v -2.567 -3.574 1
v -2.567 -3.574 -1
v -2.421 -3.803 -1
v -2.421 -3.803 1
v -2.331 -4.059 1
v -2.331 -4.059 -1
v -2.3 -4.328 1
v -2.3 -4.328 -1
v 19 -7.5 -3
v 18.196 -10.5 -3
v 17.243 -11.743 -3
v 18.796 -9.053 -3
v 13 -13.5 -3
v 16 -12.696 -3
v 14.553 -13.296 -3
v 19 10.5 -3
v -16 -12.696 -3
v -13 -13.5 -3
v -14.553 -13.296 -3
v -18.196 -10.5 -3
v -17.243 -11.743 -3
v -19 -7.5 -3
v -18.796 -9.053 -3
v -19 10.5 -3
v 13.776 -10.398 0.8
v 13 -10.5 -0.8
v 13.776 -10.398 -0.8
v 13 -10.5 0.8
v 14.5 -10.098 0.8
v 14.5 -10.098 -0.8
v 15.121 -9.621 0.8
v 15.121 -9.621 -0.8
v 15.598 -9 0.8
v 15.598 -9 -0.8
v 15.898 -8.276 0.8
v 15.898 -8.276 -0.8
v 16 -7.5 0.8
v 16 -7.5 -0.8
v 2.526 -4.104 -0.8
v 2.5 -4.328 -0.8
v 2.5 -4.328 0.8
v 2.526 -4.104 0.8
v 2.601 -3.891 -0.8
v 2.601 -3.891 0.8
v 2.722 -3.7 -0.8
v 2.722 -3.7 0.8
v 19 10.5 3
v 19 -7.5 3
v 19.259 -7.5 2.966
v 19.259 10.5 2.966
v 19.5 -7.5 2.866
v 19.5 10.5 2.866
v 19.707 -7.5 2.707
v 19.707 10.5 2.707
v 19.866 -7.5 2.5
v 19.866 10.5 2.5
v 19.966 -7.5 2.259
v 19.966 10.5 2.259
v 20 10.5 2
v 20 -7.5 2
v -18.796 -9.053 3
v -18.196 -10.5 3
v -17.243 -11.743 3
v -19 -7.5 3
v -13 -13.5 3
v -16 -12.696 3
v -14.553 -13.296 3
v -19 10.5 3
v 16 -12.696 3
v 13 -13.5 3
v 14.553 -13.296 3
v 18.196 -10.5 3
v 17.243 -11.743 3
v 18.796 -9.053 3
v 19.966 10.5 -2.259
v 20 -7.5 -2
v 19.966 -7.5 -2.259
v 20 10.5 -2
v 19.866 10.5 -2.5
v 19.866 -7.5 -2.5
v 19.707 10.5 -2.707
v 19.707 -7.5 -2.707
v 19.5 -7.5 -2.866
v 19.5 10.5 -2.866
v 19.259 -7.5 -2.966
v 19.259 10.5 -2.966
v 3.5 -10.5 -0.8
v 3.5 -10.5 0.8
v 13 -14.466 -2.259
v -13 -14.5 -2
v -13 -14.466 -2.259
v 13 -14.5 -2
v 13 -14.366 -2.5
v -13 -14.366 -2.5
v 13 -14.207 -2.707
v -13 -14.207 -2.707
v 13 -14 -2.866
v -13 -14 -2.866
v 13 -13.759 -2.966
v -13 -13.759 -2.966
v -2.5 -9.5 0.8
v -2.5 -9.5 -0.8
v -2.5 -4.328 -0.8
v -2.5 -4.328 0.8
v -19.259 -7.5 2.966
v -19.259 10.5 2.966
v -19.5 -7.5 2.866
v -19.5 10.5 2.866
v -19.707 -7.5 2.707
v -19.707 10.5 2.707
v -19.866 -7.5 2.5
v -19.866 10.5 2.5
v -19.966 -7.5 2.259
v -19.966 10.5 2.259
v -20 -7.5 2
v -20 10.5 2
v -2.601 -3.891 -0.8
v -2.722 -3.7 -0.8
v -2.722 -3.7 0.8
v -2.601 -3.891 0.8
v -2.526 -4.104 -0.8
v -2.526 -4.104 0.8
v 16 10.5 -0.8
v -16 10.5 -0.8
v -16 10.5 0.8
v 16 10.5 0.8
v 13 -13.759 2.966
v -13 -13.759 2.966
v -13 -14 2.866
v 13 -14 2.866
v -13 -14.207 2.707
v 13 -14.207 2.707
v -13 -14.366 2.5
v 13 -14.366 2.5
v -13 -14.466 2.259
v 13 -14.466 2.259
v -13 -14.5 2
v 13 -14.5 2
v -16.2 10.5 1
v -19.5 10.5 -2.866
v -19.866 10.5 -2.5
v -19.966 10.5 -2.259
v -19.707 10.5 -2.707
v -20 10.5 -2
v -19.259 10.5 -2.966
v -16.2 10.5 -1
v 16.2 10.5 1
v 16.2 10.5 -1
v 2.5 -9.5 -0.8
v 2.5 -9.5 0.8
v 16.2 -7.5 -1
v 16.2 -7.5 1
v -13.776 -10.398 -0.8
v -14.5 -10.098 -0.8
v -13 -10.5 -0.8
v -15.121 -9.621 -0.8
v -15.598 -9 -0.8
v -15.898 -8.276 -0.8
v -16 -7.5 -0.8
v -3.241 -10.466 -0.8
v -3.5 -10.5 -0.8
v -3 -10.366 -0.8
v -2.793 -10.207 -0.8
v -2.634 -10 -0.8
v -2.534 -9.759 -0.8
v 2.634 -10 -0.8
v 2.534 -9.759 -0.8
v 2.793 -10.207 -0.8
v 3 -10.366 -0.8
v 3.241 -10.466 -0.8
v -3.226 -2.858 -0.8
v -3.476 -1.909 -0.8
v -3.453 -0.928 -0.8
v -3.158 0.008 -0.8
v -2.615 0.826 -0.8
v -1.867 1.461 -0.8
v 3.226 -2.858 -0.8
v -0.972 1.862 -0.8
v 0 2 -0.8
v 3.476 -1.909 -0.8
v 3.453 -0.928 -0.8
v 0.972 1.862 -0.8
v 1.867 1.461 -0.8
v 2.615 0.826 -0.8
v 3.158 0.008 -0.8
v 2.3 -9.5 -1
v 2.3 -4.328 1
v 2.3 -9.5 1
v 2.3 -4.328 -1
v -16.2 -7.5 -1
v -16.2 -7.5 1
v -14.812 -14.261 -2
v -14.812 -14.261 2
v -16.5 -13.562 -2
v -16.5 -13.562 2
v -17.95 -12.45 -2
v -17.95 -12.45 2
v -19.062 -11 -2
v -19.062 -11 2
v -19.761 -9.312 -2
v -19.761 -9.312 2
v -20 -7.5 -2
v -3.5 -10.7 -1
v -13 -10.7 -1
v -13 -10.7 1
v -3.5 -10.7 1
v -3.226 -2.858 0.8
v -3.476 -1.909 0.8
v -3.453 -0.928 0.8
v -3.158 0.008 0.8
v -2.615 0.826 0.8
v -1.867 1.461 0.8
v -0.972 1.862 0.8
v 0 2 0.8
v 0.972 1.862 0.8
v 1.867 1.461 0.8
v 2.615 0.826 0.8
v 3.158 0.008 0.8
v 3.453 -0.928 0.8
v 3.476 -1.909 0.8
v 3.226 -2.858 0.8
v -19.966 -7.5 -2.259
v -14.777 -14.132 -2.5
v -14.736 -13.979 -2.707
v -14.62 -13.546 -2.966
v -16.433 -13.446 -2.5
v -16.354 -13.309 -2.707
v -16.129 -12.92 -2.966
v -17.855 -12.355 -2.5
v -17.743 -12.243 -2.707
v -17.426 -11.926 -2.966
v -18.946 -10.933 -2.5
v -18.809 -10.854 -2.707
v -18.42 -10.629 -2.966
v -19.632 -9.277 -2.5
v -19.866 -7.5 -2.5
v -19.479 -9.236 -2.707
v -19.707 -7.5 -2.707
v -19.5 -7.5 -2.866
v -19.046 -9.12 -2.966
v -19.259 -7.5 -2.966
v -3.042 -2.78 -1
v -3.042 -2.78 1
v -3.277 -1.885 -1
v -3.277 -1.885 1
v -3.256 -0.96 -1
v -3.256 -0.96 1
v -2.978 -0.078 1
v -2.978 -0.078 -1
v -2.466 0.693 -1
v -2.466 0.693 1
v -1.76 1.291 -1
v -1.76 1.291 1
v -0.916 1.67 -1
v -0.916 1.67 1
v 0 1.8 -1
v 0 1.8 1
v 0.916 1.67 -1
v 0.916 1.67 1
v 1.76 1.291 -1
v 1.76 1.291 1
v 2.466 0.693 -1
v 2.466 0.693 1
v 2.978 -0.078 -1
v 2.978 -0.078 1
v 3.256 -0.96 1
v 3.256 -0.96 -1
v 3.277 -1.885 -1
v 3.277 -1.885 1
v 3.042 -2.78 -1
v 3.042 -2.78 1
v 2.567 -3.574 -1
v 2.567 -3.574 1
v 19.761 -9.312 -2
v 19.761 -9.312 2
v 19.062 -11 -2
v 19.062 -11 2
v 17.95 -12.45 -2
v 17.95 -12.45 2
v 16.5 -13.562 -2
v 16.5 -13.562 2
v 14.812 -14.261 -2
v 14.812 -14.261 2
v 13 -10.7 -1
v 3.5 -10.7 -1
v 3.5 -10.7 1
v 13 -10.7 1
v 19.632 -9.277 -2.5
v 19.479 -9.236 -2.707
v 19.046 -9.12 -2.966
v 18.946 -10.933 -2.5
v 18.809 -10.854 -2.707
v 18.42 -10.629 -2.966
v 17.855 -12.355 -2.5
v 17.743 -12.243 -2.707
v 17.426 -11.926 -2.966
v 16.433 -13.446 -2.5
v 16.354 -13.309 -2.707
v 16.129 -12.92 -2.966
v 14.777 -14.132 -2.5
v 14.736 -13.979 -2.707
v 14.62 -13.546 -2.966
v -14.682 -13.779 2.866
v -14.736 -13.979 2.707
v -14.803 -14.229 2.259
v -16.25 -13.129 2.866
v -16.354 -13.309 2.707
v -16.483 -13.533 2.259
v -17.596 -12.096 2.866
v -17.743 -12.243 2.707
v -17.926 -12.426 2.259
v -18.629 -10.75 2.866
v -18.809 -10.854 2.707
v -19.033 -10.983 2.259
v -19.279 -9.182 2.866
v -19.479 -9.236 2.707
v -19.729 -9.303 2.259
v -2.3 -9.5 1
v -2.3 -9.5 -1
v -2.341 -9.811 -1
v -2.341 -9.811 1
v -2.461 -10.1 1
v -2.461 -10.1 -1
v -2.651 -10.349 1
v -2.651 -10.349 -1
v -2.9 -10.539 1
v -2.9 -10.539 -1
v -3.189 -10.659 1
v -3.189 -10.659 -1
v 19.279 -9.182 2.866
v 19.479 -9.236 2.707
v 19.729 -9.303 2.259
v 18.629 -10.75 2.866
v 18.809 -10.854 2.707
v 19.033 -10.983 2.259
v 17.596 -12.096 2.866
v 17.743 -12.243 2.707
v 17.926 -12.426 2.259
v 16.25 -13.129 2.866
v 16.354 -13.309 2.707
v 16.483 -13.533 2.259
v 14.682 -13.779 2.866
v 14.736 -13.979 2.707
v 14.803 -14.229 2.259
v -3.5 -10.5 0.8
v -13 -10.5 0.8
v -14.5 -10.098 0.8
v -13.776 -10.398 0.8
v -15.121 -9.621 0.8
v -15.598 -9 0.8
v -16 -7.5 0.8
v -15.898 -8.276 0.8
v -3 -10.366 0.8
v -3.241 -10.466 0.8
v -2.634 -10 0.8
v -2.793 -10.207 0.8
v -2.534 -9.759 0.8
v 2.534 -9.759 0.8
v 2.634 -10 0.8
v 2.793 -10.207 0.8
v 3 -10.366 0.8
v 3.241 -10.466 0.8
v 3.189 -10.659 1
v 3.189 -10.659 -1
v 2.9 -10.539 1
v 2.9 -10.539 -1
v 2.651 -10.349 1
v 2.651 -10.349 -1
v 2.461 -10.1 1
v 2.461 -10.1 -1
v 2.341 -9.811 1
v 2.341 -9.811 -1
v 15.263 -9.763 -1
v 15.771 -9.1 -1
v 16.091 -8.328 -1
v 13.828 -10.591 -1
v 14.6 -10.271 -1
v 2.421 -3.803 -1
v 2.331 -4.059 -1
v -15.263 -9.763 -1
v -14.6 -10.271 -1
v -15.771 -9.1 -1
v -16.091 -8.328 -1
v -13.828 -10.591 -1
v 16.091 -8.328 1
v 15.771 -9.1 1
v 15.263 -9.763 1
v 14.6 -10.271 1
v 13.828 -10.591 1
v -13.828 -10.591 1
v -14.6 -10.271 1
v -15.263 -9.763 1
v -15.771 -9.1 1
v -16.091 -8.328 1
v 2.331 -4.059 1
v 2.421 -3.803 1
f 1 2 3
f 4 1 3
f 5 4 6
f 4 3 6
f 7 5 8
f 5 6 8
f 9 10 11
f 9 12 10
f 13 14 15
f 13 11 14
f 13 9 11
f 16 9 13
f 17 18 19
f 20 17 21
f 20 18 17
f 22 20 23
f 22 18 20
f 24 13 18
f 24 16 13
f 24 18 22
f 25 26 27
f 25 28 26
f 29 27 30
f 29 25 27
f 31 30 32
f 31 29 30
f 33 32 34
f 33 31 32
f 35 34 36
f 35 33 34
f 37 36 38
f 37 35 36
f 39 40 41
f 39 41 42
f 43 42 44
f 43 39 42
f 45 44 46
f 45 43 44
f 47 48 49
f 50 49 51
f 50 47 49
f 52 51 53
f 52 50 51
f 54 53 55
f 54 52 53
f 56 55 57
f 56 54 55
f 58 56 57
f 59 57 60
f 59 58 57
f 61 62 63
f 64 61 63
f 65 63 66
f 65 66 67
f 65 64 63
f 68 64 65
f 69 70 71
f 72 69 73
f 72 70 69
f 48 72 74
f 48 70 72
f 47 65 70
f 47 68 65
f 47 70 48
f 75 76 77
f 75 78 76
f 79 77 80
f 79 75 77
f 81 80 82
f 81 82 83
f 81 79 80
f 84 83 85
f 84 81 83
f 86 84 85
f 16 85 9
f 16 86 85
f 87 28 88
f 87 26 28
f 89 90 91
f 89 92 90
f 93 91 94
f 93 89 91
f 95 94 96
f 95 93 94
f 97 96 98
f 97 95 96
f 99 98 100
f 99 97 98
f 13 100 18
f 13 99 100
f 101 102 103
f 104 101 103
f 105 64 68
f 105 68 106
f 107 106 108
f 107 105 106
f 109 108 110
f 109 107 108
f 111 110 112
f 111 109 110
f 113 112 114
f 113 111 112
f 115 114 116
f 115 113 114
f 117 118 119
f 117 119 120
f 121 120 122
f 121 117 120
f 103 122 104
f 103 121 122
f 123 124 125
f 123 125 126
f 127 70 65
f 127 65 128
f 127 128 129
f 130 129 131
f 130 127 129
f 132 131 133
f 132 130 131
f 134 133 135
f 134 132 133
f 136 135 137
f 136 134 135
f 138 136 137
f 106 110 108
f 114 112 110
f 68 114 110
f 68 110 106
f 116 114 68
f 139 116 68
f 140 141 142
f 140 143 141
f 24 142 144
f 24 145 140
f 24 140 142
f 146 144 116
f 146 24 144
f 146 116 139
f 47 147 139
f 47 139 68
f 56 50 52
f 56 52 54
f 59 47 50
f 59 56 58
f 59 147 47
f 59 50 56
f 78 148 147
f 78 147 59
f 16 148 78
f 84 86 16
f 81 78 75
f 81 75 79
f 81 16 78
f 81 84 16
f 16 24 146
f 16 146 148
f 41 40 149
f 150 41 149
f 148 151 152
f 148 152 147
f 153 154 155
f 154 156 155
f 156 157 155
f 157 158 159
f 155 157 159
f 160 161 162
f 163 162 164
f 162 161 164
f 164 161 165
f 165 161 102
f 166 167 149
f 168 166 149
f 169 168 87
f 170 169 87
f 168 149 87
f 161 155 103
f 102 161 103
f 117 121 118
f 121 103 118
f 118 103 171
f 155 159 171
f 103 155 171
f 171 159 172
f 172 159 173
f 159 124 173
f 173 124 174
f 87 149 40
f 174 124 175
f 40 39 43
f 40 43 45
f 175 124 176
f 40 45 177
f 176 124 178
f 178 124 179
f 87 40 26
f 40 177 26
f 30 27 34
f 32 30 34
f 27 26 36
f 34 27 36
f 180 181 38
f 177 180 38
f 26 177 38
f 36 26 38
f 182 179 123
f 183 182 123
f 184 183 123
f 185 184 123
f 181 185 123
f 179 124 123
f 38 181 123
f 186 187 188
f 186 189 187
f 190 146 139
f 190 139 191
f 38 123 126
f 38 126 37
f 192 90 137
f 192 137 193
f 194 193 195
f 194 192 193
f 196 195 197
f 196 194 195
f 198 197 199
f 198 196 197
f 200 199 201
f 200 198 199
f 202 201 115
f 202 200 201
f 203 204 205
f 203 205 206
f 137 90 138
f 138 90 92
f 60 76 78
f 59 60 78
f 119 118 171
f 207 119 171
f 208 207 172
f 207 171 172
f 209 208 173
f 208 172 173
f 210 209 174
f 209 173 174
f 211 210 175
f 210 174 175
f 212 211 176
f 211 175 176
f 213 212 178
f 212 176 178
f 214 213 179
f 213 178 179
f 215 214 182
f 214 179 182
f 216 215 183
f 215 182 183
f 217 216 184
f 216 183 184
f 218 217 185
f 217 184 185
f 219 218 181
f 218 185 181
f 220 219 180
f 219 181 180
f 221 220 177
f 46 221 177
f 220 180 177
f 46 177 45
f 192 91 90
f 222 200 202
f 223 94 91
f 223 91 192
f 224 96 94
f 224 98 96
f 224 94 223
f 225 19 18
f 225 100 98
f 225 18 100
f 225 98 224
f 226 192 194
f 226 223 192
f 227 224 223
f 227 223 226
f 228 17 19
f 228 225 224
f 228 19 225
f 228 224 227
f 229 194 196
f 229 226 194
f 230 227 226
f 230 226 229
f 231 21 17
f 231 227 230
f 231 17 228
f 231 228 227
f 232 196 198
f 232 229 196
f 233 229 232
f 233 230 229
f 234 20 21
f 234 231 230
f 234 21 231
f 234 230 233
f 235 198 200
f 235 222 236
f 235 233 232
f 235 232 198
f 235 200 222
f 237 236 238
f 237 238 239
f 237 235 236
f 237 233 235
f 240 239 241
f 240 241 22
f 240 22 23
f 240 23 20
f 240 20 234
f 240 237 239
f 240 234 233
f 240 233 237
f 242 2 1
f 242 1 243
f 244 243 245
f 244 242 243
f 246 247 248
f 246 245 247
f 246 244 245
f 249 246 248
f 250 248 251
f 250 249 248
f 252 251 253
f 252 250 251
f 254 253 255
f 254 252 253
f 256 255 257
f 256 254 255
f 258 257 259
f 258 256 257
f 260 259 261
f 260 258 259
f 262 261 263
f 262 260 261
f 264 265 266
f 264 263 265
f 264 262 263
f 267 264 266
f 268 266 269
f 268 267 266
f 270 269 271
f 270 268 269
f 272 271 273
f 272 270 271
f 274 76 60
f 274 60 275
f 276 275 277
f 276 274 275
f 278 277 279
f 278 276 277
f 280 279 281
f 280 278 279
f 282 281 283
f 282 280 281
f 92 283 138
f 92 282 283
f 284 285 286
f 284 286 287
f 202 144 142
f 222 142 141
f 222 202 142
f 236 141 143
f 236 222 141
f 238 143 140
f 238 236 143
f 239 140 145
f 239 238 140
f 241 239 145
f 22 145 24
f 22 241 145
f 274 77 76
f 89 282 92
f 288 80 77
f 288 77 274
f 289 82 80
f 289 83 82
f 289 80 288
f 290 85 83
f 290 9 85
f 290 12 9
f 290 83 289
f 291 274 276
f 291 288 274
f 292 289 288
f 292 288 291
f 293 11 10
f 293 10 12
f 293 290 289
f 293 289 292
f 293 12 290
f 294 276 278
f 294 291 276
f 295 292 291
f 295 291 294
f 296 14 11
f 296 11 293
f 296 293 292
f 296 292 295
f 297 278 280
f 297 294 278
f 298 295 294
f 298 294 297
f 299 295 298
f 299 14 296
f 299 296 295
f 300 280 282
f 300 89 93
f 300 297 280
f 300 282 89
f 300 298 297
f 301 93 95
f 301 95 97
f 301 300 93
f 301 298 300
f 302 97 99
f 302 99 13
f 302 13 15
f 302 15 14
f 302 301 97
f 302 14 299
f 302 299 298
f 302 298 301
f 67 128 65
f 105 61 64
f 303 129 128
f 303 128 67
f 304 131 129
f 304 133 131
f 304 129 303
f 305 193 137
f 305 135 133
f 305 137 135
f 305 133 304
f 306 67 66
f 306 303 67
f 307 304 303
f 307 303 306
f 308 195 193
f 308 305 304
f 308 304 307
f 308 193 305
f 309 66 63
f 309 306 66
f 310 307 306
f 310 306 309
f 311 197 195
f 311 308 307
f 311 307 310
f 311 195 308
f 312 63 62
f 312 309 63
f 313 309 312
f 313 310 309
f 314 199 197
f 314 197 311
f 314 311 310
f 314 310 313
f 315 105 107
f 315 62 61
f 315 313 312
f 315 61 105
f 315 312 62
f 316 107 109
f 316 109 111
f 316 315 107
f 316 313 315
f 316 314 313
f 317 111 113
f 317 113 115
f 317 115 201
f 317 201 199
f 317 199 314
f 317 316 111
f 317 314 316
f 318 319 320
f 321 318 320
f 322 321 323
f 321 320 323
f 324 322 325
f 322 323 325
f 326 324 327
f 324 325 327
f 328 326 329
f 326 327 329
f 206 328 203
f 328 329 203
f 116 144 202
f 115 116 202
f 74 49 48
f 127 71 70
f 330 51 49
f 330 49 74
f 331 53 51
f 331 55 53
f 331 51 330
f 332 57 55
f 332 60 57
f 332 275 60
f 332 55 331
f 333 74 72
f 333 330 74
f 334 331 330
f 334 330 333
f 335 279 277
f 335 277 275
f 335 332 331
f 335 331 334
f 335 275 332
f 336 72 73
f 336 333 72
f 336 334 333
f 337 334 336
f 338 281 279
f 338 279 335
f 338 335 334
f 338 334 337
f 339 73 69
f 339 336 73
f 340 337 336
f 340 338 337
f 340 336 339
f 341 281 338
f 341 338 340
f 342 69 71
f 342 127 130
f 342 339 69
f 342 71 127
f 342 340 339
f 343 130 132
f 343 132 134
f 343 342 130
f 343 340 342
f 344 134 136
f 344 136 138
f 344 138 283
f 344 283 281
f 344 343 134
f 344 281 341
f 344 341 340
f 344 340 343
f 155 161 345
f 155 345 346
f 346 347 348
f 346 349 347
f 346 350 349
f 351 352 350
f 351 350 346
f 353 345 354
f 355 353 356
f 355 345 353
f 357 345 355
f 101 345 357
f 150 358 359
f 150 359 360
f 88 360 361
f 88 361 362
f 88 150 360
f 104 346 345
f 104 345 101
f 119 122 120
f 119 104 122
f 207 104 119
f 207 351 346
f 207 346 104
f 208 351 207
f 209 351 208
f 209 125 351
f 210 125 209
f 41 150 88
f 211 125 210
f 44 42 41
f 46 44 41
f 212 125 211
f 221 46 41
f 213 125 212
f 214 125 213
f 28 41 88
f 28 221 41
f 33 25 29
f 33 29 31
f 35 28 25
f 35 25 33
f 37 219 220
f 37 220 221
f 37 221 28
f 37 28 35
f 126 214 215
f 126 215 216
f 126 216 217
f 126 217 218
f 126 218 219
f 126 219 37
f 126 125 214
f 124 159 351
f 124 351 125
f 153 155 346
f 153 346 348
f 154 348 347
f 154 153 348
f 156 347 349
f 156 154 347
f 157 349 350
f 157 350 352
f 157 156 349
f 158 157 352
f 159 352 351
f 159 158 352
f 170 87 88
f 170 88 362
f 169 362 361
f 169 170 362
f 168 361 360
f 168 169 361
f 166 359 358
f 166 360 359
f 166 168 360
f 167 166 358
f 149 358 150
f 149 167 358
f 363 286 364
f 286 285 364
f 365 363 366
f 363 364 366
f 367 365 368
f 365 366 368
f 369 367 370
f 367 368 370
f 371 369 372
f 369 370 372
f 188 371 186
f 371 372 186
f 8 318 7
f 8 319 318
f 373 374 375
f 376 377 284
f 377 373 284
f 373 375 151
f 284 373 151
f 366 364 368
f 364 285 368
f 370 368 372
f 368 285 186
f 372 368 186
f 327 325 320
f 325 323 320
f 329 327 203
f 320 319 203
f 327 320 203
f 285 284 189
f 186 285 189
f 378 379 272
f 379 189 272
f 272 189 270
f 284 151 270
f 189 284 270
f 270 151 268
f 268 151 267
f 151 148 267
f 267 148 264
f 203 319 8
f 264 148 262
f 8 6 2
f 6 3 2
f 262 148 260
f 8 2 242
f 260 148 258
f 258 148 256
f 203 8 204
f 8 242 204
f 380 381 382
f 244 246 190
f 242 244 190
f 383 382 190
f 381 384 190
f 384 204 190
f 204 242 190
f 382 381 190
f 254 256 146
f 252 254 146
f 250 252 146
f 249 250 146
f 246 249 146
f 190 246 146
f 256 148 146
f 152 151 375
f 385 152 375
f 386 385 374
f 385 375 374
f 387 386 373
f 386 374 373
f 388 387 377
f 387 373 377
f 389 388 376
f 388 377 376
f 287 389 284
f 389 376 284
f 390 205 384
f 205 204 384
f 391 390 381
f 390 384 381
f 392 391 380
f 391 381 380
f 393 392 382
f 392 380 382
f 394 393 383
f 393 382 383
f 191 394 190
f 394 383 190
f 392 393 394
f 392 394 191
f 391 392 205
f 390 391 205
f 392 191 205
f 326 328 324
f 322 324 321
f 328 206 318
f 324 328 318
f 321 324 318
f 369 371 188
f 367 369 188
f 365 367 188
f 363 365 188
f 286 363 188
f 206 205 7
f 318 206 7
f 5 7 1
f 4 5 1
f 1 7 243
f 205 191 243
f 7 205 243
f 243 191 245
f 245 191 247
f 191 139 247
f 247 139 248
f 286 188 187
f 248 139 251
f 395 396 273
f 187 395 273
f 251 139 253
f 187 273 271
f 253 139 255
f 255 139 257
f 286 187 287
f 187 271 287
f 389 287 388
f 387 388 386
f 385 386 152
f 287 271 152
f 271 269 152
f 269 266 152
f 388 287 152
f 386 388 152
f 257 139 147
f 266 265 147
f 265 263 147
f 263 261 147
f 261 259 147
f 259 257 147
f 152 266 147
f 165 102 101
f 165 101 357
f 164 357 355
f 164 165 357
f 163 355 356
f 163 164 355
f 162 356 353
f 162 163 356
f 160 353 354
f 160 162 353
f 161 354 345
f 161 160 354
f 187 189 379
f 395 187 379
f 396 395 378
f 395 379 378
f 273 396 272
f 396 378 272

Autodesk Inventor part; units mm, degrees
ref_plane "YZ Plane" through (0, 0, 0) normal (1, 0, 0) x (0, 1, 0)
ref_plane "XZ Plane" through (0, 0, 0) normal (0, 1, 0) x (-1, 0, 0)
ref_plane "XY Plane" through (0, 0, 0) normal (0, 0, 1) x (1, 0, 0)
sketch "Sketch3" plane through (0, 0, 0) normal (0, 0, 1) x (1, 0, 0)
  line L0 (16, -10.5) -> (-16, -10.5)
  line L1 (-16, -10.5) -> (-16, 10.5)
  line L2 (-16, 10.5) -> (16, 10.5)
  line L3 (16, 10.5) -> (16, -10.5)
  line L4 (16, -10.5) -> (-16, 10.5) construction
  line L5 (-16, -10.5) -> (16, 10.5) construction
  circle A0 centre (0, -1.5) radius 3.5
  line L6 (-2.5, -3.9495) -> (2.5, -3.9495)
  line L7 (2.5, -3.9495) -> (2.5, -10.5)
  line L8 (2.5, -10.5) -> (-2.5, -10.5)
  line L9 (-2.5, -10.5) -> (-2.5, -3.9495)
  point P0 (0, 0)
  dimension "d24" = 32
  dimension "d25" = 21
  dimension "d26" = 7
  dimension "d27" = 9
  dimension "d28" = 5
extrude "Extrusion5" add sketch "Sketch3" along normal mid plane 1.6 contours L0 L7 A0 L9 L1 L2 L3
fillet "Fillet2" radius 1 2 edges at (-2.5, -3.9495, 0) (2.5, -3.9495, 0)
fillet "Fillet3" radius 3 2 edges at (-16, -10.5, 0) (16, -10.5, 0)
fillet "Fillet4" radius 1 2 edges at (-2.5, -10.5, 0) (2.5, -10.5, 0)
sketch "Sketch4" plane through (0, 0, 0) normal (0, 0, 1) x (1, 0, 0)
  arc A0 (2.7222, -3.6999) -> (2.5, -4.3284) centre (3.5, -4.3284) ccw projected
  arc A1 (2.7222, -3.6999) -> (-2.7222, -3.6999) centre (0, -1.5) ccw projected
  arc A2 (-2.5, -4.3284) -> (-2.7222, -3.6999) centre (-3.5, -4.3284) ccw projected
  line L0 (-2.5, -4.3284) -> (-2.5, -9.5) projected
  arc A3 (-3.5, -10.5) -> (-2.5, -9.5) centre (-3.5, -9.5) ccw projected
  line L1 (-3.5, -10.5) -> (-13, -10.5) projected
  arc A4 (-16, -7.5) -> (-13, -10.5) centre (-13, -7.5) ccw projected
  line L2 (-16, -7.5) -> (-16, 10.5) projected
  line L3 (-16, 10.5) -> (16, 10.5) projected
  line L4 (16, 10.5) -> (16, -7.5) projected
  arc A5 (13, -10.5) -> (16, -7.5) centre (13, -7.5) ccw projected
  line L5 (13, -10.5) -> (3.5, -10.5) projected
  arc A6 (2.5, -9.5) -> (3.5, -10.5) centre (3.5, -9.5) ccw projected
  line L6 (2.5, -9.5) -> (2.5, -4.3284) projected
  line L7 (-16.2, 10.7) -> (-16.2, -7.5)
  arc A7 (-16.2, -7.5) -> (-13, -10.7) centre (-13, -7.5) ccw
  line L8 (-13, -10.7) -> (-3.5, -10.7)
  arc A8 (-3.5, -10.7) -> (-2.3, -9.5) centre (-3.5, -9.5) ccw
  line L9 (-2.3, -9.5) -> (-2.3, -4.3284)
  arc A9 (-2.3, -4.3284) -> (-2.5667, -3.5742) centre (-3.5, -4.3284) ccw
  arc A10 (2.5667, -3.5742) -> (-2.5667, -3.5742) centre (0, -1.5) ccw
  arc A11 (2.5667, -3.5742) -> (2.3, -4.3284) centre (3.5, -4.3284) ccw
  line L10 (2.3, -4.3284) -> (2.3, -9.5)
  arc A12 (2.3, -9.5) -> (3.5, -10.7) centre (3.5, -9.5) ccw
  line L11 (3.5, -10.7) -> (13, -10.7)
  arc A13 (13, -10.7) -> (16.2, -7.5) centre (13, -7.5) ccw
  line L12 (16.2, -7.5) -> (16.2, 10.7)
  line L13 (16.2, 10.7) -> (-16.2, 10.7)
  line L14 (-20, 14.5) -> (-20, -7.5)
  arc A14 (-20, -7.5) -> (-13, -14.5) centre (-13, -7.5) ccw
  line L15 (-13, -14.5) -> (13, -14.5)
  arc A15 (13, -14.5) -> (20, -7.5) centre (13, -7.5) ccw
  line L16 (20, -7.5) -> (20, 14.5)
  line L17 (20, 14.5) -> (-20, 14.5)
  line L18 (-20, 10.5) -> (20, 10.5)
  point P0 (0, 0)
  point P1 (-16.2, 10.5)
  point P2 (16.2, 10.5)
  dimension "d34" = 0.2
  dimension "d35" = 4
extrude "Extrusion6" add sketch "Sketch4" along normal mid plane 2 separate body contours L18 L16 A15 L15 A14 L14 L7 A7 L8 A8 L9 A9 A10 A11 L10 A12 L11 A13 L12
sketch "Sketch5" plane through (0, 0, 1) normal (0, 0, 1) x (1, 0, 0)
  line L0 (-16.2, -7.5) -> (-16.2, 10.5) projected
  line L1 (-16.2, 10.5) -> (-20, 10.5) projected
  line L2 (-20, 10.5) -> (-20, -7.5) projected
  arc A0 (-20, -7.5) -> (-13, -14.5) centre (-13, -7.5) ccw projected
  line L3 (-13, -14.5) -> (13, -14.5) projected
  arc A1 (13, -14.5) -> (20, -7.5) centre (13, -7.5) ccw projected
  line L4 (20, -7.5) -> (20, 10.5) projected
  line L5 (20, 10.5) -> (16.2, 10.5) projected
  line L6 (16.2, 10.5) -> (16.2, -7.5) projected
  arc A2 (13, -10.7) -> (16.2, -7.5) centre (13, -7.5) ccw projected
  line L7 (13, -10.7) -> (3.5, -10.7) projected
  arc A3 (2.3, -9.5) -> (3.5, -10.7) centre (3.5, -9.5) ccw projected
  line L8 (2.3, -9.5) -> (2.3, -4.3284) projected
  arc A4 (2.5667, -3.5742) -> (2.3, -4.3284) centre (3.5, -4.3284) ccw projected
  arc A5 (2.5667, -3.5742) -> (-2.5667, -3.5742) centre (0, -1.5) ccw projected
  arc A6 (-2.3, -4.3284) -> (-2.5667, -3.5742) centre (-3.5, -4.3284) ccw projected
  line L9 (-2.3, -4.3284) -> (-2.3, -9.5) projected
  arc A7 (-3.5, -10.7) -> (-2.3, -9.5) centre (-3.5, -9.5) ccw projected
  line L10 (-3.5, -10.7) -> (-13, -10.7) projected
  arc A8 (-16.2, -7.5) -> (-13, -10.7) centre (-13, -7.5) ccw projected
  line L11 (-16.2, 10.5) -> (16.2, 10.5)
  point P0 (0, 0)
extrude "Extrusion7" add sketch "Sketch5" along normal blind 2
mirror "Mirror1" about plane through (0, 0, 0) normal (0, 0, 1) of "Extrusion7"
fillet "Fillet5" radius 1 10 edges at (20, 1.5, -3) (0, -14.5, -3) (-17.9497, -12.4497, -3) (-20, 1.5, -3) (17.9497, -12.4497, -3) (20, 1.5, 3) (0, -14.5, 3) (-17.9497, -12.4497, 3) (-20, 1.5, 3) (17.9497, -12.4497, 3)
properties part number "Door Stop Bumper" material "Rubber"
